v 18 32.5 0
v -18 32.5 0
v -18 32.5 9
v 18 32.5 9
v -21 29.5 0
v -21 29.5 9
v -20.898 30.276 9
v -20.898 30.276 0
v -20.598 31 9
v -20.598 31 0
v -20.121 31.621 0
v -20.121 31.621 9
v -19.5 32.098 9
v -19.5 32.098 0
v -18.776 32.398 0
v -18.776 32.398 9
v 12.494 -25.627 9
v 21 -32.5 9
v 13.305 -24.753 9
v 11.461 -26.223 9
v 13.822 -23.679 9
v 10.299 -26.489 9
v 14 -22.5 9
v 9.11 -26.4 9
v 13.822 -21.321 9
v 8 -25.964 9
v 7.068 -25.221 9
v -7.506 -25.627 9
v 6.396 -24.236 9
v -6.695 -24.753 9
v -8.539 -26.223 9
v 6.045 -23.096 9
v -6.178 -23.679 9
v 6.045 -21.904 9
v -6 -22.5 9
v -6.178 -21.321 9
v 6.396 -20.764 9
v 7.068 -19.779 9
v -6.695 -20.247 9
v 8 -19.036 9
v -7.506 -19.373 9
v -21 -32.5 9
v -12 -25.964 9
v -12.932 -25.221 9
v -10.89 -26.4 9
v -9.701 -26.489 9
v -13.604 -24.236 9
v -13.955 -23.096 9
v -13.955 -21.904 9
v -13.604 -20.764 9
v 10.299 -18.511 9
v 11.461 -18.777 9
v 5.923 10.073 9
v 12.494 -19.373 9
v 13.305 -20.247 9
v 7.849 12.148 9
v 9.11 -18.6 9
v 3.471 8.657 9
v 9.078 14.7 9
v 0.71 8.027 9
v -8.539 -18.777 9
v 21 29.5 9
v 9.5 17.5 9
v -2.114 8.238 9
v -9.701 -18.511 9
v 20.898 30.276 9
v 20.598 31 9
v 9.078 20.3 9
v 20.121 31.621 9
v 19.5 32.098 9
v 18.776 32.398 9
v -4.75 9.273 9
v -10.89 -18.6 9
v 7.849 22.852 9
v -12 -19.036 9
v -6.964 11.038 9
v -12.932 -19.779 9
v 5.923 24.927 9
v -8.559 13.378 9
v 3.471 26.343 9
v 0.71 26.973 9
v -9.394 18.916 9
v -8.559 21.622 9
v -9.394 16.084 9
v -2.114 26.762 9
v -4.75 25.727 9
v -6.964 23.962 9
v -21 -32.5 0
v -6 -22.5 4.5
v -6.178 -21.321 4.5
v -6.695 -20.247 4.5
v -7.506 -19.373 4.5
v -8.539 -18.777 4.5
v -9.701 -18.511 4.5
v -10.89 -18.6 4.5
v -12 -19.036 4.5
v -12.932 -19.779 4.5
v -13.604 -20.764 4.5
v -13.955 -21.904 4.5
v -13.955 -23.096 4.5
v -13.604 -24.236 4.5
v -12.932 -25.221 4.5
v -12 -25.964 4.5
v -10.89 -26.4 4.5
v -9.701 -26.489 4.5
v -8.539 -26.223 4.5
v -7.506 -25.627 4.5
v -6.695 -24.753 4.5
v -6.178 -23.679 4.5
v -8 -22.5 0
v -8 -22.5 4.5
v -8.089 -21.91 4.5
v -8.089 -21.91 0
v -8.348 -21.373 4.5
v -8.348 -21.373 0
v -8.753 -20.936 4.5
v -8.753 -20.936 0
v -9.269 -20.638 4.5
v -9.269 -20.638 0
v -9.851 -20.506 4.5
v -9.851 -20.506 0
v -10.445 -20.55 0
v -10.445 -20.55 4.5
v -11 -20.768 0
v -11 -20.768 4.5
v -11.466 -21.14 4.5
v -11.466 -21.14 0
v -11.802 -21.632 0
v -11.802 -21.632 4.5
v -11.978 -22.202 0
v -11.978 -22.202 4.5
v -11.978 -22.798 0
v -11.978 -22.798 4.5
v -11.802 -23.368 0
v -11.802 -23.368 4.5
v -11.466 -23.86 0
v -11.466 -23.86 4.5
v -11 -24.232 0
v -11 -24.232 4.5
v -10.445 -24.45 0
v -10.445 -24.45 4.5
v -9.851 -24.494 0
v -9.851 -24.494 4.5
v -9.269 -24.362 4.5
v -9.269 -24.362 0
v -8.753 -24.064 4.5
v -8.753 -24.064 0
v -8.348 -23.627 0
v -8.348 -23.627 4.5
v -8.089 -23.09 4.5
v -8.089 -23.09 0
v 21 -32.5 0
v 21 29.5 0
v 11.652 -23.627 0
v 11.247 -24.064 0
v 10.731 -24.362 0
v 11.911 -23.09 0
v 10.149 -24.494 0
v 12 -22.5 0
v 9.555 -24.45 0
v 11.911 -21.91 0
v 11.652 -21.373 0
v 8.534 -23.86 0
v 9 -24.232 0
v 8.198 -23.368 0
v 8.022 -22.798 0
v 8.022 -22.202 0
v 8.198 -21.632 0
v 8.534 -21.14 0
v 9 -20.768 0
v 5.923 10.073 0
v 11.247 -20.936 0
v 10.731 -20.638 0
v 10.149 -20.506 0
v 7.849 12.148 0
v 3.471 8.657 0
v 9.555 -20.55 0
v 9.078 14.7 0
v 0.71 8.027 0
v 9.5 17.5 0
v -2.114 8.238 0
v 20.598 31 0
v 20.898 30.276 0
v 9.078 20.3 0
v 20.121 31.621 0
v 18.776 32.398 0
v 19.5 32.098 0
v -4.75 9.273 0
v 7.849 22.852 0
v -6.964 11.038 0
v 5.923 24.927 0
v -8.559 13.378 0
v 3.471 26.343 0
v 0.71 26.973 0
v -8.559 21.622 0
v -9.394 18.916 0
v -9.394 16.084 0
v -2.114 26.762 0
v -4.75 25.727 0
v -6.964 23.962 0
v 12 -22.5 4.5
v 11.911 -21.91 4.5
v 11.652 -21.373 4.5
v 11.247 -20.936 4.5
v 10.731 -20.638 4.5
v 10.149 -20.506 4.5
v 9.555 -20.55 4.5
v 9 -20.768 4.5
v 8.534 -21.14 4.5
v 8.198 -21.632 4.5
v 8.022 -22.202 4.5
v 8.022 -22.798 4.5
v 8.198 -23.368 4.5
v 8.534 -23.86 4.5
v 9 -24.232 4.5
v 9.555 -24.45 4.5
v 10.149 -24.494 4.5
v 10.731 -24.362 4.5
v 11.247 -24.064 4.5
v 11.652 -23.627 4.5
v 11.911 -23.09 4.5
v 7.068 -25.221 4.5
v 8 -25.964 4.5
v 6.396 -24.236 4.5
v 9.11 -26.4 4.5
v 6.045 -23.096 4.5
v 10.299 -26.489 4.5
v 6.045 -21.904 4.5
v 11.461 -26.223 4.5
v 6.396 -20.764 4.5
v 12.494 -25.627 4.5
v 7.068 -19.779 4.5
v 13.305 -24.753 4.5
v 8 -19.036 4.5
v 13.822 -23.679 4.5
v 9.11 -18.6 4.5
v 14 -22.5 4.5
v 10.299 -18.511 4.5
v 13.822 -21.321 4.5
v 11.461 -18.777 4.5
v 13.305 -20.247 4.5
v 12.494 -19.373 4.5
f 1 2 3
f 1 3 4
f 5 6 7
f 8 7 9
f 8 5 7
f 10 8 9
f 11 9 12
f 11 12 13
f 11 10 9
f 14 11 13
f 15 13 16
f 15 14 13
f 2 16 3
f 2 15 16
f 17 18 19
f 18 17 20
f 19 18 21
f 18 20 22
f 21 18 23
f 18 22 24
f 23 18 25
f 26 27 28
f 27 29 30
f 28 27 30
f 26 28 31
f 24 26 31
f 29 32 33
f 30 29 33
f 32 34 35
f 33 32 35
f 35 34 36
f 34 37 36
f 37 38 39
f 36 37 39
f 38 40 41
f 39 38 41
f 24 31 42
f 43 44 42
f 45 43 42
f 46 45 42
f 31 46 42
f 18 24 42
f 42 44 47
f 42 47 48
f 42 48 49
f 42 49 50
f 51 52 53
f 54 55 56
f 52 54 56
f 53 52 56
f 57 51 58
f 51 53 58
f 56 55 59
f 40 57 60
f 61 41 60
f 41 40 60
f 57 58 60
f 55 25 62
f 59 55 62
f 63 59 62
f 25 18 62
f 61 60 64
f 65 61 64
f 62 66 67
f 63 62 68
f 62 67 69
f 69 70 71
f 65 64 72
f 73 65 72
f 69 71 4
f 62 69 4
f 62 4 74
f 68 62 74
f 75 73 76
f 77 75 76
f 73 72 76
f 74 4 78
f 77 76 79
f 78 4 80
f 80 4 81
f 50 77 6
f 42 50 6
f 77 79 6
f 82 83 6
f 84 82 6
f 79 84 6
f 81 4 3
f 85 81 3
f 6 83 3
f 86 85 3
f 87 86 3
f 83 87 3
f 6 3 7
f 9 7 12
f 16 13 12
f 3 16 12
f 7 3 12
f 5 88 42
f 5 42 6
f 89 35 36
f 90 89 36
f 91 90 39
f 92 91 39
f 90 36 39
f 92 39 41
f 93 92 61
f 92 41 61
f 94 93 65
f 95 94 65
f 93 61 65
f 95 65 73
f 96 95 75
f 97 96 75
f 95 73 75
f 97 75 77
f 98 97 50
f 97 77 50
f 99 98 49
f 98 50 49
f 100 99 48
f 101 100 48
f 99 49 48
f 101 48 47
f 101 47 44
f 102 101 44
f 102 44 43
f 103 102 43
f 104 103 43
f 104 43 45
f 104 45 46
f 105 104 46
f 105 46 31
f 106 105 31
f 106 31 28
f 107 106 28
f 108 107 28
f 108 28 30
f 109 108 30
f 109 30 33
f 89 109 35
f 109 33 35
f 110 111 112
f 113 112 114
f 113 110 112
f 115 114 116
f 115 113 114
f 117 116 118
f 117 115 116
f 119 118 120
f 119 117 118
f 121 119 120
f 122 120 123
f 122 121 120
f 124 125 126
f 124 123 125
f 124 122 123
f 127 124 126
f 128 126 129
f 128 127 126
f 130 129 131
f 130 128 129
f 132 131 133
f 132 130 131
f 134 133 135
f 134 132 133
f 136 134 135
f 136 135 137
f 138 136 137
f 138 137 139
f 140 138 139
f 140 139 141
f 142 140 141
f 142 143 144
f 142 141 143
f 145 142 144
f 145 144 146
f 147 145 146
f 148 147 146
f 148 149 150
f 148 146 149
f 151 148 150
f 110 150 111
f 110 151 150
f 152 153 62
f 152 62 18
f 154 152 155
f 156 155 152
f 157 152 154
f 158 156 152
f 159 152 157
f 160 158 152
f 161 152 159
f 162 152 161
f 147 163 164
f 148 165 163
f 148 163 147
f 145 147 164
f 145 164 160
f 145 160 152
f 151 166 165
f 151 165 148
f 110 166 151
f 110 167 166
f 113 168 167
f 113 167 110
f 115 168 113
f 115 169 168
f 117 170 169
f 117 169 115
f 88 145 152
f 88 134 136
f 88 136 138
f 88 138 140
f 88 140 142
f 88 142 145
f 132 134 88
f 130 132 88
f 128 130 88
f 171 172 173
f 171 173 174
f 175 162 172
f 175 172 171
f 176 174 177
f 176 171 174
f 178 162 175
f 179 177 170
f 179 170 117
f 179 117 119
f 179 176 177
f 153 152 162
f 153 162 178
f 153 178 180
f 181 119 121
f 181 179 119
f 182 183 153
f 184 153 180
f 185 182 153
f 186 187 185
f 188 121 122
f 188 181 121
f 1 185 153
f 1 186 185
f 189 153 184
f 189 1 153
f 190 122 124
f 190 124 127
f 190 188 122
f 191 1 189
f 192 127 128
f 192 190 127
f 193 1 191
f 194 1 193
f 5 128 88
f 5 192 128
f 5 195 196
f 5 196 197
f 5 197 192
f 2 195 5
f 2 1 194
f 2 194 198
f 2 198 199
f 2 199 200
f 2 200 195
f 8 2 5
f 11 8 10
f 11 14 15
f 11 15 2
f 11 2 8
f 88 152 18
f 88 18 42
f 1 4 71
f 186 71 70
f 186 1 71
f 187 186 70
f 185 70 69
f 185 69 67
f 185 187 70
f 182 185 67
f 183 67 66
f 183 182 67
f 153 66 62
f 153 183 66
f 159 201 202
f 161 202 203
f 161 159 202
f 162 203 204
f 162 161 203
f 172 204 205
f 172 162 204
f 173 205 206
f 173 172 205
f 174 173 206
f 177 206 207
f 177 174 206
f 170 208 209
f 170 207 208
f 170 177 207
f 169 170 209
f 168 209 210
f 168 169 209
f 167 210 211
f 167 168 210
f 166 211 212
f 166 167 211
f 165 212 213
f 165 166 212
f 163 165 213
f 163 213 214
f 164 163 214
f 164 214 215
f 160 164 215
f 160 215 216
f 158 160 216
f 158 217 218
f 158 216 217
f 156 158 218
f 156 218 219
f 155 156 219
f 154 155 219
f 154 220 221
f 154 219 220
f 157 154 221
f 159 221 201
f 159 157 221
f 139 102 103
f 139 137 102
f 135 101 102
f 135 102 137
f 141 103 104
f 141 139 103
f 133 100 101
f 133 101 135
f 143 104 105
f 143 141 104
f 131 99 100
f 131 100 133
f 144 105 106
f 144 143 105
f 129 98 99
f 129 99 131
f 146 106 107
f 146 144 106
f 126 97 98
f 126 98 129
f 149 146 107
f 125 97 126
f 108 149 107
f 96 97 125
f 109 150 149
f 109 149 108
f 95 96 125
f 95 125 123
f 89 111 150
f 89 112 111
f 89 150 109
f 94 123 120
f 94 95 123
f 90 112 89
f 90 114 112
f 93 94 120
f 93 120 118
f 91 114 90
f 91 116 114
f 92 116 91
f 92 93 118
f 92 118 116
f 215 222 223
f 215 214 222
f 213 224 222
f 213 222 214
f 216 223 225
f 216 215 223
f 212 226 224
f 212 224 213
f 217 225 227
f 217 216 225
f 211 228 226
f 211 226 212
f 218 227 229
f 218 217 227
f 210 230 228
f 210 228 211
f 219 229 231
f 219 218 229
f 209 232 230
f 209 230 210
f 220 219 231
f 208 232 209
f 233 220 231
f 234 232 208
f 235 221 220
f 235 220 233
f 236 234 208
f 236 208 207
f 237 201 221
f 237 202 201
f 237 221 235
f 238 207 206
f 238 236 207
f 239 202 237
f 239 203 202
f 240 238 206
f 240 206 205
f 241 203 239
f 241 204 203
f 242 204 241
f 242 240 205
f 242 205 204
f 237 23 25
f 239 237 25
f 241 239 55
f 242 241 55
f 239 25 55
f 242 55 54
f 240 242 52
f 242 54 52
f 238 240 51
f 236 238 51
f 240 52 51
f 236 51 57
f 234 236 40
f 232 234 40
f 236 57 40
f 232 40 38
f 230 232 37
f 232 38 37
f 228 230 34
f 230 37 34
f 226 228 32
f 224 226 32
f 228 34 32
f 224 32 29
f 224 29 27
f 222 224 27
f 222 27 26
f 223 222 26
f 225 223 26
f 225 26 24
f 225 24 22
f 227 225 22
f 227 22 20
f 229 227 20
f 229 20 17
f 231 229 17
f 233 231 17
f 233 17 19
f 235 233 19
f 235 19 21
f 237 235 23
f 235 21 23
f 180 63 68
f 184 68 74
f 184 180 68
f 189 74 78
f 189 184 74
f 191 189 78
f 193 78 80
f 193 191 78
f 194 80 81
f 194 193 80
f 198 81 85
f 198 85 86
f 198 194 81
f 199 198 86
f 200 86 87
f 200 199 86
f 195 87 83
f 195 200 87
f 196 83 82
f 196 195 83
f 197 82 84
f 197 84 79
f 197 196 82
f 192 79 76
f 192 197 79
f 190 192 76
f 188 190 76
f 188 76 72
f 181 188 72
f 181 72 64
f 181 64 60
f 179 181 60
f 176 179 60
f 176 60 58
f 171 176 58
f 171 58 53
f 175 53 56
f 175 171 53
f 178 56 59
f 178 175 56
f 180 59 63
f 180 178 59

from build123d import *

# Parameters (mm, degrees)
CROQUIS1_R              = 9.5
CROQUIS1_R_2            = 2
SALIENTE_EXTRUIR1_DEPTH = 9
CROQUIS2_R              = 4
CORTAR_EXTRUIR1_DEPTH   = 4.5


with BuildPart() as part:
    # Croquis1 → Saliente-Extruir1 (new body)
    with BuildSketch(Plane.XY):
        with BuildLine():
            Line((-18, 32.5), (18, 32.5))
            ThreePointArc((18, 32.5), (20.121320344, 31.621320344), (21, 29.5))
            Line((21, 29.5), (21, -32.5))
            Line((21, -32.5), (-21, -32.5))
            Line((-21, -32.5), (-21, 29.5))
            ThreePointArc((-21, 29.5), (-20.121320344, 31.621320344), (-18, 32.5))
        make_face()
        with Locations((0, 17.5)):
            Circle(CROQUIS1_R, mode=Mode.SUBTRACT)
        with Locations((10, -22.5)):
            Circle(CROQUIS1_R_2, mode=Mode.SUBTRACT)
        with Locations((-10, -22.5)):
            Circle(CROQUIS1_R_2, mode=Mode.SUBTRACT)
    extrude(amount=SALIENTE_EXTRUIR1_DEPTH)

    # Croquis2 → Cortar-Extruir1 (cut)
    with BuildSketch(Plane.XY.offset(9)):
        with Locations((-10, -22.5)):
            Circle(CROQUIS2_R)
        with Locations((10, -22.5)):
            Circle(CROQUIS2_R)
    extrude(amount=-CORTAR_EXTRUIR1_DEPTH, mode=Mode.SUBTRACT)


solid = part.part
